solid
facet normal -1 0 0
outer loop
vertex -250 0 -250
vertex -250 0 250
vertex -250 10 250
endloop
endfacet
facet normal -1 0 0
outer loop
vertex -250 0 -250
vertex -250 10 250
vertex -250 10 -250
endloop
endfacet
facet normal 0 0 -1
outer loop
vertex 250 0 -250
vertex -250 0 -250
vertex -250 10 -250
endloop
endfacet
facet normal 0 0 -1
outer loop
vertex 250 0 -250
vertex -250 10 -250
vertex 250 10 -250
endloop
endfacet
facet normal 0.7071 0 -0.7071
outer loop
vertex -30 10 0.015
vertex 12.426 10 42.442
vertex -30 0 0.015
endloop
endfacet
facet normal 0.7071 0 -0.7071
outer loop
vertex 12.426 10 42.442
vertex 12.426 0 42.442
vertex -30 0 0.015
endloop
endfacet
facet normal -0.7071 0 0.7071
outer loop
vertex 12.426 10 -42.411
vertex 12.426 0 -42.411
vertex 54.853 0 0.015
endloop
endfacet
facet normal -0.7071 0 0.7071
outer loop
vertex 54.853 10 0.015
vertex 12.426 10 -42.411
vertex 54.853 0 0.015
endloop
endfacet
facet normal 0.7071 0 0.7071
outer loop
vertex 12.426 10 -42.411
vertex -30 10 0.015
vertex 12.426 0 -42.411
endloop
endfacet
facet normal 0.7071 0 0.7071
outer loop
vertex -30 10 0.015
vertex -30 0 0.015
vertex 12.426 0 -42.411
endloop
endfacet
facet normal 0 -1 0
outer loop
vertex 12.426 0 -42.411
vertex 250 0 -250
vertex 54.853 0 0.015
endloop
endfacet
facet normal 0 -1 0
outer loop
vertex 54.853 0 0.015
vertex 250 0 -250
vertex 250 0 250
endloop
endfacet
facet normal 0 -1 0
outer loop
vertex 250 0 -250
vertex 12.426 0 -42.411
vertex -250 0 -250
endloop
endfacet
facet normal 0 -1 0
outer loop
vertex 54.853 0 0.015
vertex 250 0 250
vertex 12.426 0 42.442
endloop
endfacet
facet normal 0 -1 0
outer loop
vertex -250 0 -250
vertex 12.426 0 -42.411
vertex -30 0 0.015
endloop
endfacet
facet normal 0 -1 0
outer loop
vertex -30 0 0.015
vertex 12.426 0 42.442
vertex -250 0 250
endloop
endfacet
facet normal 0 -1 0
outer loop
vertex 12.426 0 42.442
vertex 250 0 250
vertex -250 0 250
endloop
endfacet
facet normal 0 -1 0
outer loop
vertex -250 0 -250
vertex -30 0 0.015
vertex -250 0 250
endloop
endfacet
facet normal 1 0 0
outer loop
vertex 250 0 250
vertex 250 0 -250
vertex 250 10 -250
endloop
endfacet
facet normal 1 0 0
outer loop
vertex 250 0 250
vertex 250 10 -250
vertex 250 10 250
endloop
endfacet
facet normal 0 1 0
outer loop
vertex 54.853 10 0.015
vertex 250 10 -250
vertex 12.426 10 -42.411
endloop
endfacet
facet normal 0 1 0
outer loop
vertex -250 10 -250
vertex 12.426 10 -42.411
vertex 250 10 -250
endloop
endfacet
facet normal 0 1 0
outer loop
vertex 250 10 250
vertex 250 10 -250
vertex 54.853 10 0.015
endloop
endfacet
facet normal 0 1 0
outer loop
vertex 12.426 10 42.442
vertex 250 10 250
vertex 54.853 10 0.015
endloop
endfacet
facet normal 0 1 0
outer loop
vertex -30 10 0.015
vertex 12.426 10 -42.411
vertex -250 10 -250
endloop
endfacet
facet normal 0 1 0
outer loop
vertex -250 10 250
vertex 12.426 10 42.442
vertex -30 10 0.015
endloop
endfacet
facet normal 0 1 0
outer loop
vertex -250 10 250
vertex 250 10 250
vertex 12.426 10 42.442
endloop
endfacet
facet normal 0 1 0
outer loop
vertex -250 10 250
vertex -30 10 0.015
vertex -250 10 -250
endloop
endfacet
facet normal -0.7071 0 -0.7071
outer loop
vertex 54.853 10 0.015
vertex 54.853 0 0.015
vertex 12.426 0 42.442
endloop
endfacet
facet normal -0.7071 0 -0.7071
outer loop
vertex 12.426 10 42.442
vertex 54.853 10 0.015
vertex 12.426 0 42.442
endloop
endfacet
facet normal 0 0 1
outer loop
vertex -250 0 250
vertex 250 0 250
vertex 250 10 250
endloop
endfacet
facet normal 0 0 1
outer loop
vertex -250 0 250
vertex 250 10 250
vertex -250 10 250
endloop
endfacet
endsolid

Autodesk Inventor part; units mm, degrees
ref_plane "YZ Plane" through (0, 0, 0) normal (1, 0, 0) x (0, 1, 0)
ref_plane "XZ Plane" through (0, 0, 0) normal (0, 1, 0) x (-1, 0, 0)
ref_plane "XY Plane" through (0, 0, 0) normal (0, 0, 1) x (1, 0, 0)
sketch "Sketch1" plane through (0, 0, 0) normal (0, 1, 0) x (-1, 0, 0)
  line L0 (-250, 250) -> (250, 250)
  line L1 (250, 250) -> (250, -250)
  line L2 (250, -250) -> (-250, -250)
  line L3 (-250, -250) -> (-250, 250)
  line L4 (-250, 250) -> (250, -250) construction
  line L5 (250, 250) -> (-250, -250) construction
  line L6 (-12.4264, 42.4417) -> (30, 0.0153)
  line L7 (30, 0.0153) -> (-12.4264, -42.4112)
  line L8 (-12.4264, -42.4112) -> (-54.8528, 0.0153)
  line L9 (-54.8528, 0.0153) -> (-12.4264, 42.4417)
  point P0 (0, 0)
  dimension "d0" = 500
  dimension "d1" = 60
  dimension "d2" = 30
  dimension "d3" = 54.8528
extrude "Extrusion1" add sketch "Sketch1" along normal blind 10
properties part number "wer"
